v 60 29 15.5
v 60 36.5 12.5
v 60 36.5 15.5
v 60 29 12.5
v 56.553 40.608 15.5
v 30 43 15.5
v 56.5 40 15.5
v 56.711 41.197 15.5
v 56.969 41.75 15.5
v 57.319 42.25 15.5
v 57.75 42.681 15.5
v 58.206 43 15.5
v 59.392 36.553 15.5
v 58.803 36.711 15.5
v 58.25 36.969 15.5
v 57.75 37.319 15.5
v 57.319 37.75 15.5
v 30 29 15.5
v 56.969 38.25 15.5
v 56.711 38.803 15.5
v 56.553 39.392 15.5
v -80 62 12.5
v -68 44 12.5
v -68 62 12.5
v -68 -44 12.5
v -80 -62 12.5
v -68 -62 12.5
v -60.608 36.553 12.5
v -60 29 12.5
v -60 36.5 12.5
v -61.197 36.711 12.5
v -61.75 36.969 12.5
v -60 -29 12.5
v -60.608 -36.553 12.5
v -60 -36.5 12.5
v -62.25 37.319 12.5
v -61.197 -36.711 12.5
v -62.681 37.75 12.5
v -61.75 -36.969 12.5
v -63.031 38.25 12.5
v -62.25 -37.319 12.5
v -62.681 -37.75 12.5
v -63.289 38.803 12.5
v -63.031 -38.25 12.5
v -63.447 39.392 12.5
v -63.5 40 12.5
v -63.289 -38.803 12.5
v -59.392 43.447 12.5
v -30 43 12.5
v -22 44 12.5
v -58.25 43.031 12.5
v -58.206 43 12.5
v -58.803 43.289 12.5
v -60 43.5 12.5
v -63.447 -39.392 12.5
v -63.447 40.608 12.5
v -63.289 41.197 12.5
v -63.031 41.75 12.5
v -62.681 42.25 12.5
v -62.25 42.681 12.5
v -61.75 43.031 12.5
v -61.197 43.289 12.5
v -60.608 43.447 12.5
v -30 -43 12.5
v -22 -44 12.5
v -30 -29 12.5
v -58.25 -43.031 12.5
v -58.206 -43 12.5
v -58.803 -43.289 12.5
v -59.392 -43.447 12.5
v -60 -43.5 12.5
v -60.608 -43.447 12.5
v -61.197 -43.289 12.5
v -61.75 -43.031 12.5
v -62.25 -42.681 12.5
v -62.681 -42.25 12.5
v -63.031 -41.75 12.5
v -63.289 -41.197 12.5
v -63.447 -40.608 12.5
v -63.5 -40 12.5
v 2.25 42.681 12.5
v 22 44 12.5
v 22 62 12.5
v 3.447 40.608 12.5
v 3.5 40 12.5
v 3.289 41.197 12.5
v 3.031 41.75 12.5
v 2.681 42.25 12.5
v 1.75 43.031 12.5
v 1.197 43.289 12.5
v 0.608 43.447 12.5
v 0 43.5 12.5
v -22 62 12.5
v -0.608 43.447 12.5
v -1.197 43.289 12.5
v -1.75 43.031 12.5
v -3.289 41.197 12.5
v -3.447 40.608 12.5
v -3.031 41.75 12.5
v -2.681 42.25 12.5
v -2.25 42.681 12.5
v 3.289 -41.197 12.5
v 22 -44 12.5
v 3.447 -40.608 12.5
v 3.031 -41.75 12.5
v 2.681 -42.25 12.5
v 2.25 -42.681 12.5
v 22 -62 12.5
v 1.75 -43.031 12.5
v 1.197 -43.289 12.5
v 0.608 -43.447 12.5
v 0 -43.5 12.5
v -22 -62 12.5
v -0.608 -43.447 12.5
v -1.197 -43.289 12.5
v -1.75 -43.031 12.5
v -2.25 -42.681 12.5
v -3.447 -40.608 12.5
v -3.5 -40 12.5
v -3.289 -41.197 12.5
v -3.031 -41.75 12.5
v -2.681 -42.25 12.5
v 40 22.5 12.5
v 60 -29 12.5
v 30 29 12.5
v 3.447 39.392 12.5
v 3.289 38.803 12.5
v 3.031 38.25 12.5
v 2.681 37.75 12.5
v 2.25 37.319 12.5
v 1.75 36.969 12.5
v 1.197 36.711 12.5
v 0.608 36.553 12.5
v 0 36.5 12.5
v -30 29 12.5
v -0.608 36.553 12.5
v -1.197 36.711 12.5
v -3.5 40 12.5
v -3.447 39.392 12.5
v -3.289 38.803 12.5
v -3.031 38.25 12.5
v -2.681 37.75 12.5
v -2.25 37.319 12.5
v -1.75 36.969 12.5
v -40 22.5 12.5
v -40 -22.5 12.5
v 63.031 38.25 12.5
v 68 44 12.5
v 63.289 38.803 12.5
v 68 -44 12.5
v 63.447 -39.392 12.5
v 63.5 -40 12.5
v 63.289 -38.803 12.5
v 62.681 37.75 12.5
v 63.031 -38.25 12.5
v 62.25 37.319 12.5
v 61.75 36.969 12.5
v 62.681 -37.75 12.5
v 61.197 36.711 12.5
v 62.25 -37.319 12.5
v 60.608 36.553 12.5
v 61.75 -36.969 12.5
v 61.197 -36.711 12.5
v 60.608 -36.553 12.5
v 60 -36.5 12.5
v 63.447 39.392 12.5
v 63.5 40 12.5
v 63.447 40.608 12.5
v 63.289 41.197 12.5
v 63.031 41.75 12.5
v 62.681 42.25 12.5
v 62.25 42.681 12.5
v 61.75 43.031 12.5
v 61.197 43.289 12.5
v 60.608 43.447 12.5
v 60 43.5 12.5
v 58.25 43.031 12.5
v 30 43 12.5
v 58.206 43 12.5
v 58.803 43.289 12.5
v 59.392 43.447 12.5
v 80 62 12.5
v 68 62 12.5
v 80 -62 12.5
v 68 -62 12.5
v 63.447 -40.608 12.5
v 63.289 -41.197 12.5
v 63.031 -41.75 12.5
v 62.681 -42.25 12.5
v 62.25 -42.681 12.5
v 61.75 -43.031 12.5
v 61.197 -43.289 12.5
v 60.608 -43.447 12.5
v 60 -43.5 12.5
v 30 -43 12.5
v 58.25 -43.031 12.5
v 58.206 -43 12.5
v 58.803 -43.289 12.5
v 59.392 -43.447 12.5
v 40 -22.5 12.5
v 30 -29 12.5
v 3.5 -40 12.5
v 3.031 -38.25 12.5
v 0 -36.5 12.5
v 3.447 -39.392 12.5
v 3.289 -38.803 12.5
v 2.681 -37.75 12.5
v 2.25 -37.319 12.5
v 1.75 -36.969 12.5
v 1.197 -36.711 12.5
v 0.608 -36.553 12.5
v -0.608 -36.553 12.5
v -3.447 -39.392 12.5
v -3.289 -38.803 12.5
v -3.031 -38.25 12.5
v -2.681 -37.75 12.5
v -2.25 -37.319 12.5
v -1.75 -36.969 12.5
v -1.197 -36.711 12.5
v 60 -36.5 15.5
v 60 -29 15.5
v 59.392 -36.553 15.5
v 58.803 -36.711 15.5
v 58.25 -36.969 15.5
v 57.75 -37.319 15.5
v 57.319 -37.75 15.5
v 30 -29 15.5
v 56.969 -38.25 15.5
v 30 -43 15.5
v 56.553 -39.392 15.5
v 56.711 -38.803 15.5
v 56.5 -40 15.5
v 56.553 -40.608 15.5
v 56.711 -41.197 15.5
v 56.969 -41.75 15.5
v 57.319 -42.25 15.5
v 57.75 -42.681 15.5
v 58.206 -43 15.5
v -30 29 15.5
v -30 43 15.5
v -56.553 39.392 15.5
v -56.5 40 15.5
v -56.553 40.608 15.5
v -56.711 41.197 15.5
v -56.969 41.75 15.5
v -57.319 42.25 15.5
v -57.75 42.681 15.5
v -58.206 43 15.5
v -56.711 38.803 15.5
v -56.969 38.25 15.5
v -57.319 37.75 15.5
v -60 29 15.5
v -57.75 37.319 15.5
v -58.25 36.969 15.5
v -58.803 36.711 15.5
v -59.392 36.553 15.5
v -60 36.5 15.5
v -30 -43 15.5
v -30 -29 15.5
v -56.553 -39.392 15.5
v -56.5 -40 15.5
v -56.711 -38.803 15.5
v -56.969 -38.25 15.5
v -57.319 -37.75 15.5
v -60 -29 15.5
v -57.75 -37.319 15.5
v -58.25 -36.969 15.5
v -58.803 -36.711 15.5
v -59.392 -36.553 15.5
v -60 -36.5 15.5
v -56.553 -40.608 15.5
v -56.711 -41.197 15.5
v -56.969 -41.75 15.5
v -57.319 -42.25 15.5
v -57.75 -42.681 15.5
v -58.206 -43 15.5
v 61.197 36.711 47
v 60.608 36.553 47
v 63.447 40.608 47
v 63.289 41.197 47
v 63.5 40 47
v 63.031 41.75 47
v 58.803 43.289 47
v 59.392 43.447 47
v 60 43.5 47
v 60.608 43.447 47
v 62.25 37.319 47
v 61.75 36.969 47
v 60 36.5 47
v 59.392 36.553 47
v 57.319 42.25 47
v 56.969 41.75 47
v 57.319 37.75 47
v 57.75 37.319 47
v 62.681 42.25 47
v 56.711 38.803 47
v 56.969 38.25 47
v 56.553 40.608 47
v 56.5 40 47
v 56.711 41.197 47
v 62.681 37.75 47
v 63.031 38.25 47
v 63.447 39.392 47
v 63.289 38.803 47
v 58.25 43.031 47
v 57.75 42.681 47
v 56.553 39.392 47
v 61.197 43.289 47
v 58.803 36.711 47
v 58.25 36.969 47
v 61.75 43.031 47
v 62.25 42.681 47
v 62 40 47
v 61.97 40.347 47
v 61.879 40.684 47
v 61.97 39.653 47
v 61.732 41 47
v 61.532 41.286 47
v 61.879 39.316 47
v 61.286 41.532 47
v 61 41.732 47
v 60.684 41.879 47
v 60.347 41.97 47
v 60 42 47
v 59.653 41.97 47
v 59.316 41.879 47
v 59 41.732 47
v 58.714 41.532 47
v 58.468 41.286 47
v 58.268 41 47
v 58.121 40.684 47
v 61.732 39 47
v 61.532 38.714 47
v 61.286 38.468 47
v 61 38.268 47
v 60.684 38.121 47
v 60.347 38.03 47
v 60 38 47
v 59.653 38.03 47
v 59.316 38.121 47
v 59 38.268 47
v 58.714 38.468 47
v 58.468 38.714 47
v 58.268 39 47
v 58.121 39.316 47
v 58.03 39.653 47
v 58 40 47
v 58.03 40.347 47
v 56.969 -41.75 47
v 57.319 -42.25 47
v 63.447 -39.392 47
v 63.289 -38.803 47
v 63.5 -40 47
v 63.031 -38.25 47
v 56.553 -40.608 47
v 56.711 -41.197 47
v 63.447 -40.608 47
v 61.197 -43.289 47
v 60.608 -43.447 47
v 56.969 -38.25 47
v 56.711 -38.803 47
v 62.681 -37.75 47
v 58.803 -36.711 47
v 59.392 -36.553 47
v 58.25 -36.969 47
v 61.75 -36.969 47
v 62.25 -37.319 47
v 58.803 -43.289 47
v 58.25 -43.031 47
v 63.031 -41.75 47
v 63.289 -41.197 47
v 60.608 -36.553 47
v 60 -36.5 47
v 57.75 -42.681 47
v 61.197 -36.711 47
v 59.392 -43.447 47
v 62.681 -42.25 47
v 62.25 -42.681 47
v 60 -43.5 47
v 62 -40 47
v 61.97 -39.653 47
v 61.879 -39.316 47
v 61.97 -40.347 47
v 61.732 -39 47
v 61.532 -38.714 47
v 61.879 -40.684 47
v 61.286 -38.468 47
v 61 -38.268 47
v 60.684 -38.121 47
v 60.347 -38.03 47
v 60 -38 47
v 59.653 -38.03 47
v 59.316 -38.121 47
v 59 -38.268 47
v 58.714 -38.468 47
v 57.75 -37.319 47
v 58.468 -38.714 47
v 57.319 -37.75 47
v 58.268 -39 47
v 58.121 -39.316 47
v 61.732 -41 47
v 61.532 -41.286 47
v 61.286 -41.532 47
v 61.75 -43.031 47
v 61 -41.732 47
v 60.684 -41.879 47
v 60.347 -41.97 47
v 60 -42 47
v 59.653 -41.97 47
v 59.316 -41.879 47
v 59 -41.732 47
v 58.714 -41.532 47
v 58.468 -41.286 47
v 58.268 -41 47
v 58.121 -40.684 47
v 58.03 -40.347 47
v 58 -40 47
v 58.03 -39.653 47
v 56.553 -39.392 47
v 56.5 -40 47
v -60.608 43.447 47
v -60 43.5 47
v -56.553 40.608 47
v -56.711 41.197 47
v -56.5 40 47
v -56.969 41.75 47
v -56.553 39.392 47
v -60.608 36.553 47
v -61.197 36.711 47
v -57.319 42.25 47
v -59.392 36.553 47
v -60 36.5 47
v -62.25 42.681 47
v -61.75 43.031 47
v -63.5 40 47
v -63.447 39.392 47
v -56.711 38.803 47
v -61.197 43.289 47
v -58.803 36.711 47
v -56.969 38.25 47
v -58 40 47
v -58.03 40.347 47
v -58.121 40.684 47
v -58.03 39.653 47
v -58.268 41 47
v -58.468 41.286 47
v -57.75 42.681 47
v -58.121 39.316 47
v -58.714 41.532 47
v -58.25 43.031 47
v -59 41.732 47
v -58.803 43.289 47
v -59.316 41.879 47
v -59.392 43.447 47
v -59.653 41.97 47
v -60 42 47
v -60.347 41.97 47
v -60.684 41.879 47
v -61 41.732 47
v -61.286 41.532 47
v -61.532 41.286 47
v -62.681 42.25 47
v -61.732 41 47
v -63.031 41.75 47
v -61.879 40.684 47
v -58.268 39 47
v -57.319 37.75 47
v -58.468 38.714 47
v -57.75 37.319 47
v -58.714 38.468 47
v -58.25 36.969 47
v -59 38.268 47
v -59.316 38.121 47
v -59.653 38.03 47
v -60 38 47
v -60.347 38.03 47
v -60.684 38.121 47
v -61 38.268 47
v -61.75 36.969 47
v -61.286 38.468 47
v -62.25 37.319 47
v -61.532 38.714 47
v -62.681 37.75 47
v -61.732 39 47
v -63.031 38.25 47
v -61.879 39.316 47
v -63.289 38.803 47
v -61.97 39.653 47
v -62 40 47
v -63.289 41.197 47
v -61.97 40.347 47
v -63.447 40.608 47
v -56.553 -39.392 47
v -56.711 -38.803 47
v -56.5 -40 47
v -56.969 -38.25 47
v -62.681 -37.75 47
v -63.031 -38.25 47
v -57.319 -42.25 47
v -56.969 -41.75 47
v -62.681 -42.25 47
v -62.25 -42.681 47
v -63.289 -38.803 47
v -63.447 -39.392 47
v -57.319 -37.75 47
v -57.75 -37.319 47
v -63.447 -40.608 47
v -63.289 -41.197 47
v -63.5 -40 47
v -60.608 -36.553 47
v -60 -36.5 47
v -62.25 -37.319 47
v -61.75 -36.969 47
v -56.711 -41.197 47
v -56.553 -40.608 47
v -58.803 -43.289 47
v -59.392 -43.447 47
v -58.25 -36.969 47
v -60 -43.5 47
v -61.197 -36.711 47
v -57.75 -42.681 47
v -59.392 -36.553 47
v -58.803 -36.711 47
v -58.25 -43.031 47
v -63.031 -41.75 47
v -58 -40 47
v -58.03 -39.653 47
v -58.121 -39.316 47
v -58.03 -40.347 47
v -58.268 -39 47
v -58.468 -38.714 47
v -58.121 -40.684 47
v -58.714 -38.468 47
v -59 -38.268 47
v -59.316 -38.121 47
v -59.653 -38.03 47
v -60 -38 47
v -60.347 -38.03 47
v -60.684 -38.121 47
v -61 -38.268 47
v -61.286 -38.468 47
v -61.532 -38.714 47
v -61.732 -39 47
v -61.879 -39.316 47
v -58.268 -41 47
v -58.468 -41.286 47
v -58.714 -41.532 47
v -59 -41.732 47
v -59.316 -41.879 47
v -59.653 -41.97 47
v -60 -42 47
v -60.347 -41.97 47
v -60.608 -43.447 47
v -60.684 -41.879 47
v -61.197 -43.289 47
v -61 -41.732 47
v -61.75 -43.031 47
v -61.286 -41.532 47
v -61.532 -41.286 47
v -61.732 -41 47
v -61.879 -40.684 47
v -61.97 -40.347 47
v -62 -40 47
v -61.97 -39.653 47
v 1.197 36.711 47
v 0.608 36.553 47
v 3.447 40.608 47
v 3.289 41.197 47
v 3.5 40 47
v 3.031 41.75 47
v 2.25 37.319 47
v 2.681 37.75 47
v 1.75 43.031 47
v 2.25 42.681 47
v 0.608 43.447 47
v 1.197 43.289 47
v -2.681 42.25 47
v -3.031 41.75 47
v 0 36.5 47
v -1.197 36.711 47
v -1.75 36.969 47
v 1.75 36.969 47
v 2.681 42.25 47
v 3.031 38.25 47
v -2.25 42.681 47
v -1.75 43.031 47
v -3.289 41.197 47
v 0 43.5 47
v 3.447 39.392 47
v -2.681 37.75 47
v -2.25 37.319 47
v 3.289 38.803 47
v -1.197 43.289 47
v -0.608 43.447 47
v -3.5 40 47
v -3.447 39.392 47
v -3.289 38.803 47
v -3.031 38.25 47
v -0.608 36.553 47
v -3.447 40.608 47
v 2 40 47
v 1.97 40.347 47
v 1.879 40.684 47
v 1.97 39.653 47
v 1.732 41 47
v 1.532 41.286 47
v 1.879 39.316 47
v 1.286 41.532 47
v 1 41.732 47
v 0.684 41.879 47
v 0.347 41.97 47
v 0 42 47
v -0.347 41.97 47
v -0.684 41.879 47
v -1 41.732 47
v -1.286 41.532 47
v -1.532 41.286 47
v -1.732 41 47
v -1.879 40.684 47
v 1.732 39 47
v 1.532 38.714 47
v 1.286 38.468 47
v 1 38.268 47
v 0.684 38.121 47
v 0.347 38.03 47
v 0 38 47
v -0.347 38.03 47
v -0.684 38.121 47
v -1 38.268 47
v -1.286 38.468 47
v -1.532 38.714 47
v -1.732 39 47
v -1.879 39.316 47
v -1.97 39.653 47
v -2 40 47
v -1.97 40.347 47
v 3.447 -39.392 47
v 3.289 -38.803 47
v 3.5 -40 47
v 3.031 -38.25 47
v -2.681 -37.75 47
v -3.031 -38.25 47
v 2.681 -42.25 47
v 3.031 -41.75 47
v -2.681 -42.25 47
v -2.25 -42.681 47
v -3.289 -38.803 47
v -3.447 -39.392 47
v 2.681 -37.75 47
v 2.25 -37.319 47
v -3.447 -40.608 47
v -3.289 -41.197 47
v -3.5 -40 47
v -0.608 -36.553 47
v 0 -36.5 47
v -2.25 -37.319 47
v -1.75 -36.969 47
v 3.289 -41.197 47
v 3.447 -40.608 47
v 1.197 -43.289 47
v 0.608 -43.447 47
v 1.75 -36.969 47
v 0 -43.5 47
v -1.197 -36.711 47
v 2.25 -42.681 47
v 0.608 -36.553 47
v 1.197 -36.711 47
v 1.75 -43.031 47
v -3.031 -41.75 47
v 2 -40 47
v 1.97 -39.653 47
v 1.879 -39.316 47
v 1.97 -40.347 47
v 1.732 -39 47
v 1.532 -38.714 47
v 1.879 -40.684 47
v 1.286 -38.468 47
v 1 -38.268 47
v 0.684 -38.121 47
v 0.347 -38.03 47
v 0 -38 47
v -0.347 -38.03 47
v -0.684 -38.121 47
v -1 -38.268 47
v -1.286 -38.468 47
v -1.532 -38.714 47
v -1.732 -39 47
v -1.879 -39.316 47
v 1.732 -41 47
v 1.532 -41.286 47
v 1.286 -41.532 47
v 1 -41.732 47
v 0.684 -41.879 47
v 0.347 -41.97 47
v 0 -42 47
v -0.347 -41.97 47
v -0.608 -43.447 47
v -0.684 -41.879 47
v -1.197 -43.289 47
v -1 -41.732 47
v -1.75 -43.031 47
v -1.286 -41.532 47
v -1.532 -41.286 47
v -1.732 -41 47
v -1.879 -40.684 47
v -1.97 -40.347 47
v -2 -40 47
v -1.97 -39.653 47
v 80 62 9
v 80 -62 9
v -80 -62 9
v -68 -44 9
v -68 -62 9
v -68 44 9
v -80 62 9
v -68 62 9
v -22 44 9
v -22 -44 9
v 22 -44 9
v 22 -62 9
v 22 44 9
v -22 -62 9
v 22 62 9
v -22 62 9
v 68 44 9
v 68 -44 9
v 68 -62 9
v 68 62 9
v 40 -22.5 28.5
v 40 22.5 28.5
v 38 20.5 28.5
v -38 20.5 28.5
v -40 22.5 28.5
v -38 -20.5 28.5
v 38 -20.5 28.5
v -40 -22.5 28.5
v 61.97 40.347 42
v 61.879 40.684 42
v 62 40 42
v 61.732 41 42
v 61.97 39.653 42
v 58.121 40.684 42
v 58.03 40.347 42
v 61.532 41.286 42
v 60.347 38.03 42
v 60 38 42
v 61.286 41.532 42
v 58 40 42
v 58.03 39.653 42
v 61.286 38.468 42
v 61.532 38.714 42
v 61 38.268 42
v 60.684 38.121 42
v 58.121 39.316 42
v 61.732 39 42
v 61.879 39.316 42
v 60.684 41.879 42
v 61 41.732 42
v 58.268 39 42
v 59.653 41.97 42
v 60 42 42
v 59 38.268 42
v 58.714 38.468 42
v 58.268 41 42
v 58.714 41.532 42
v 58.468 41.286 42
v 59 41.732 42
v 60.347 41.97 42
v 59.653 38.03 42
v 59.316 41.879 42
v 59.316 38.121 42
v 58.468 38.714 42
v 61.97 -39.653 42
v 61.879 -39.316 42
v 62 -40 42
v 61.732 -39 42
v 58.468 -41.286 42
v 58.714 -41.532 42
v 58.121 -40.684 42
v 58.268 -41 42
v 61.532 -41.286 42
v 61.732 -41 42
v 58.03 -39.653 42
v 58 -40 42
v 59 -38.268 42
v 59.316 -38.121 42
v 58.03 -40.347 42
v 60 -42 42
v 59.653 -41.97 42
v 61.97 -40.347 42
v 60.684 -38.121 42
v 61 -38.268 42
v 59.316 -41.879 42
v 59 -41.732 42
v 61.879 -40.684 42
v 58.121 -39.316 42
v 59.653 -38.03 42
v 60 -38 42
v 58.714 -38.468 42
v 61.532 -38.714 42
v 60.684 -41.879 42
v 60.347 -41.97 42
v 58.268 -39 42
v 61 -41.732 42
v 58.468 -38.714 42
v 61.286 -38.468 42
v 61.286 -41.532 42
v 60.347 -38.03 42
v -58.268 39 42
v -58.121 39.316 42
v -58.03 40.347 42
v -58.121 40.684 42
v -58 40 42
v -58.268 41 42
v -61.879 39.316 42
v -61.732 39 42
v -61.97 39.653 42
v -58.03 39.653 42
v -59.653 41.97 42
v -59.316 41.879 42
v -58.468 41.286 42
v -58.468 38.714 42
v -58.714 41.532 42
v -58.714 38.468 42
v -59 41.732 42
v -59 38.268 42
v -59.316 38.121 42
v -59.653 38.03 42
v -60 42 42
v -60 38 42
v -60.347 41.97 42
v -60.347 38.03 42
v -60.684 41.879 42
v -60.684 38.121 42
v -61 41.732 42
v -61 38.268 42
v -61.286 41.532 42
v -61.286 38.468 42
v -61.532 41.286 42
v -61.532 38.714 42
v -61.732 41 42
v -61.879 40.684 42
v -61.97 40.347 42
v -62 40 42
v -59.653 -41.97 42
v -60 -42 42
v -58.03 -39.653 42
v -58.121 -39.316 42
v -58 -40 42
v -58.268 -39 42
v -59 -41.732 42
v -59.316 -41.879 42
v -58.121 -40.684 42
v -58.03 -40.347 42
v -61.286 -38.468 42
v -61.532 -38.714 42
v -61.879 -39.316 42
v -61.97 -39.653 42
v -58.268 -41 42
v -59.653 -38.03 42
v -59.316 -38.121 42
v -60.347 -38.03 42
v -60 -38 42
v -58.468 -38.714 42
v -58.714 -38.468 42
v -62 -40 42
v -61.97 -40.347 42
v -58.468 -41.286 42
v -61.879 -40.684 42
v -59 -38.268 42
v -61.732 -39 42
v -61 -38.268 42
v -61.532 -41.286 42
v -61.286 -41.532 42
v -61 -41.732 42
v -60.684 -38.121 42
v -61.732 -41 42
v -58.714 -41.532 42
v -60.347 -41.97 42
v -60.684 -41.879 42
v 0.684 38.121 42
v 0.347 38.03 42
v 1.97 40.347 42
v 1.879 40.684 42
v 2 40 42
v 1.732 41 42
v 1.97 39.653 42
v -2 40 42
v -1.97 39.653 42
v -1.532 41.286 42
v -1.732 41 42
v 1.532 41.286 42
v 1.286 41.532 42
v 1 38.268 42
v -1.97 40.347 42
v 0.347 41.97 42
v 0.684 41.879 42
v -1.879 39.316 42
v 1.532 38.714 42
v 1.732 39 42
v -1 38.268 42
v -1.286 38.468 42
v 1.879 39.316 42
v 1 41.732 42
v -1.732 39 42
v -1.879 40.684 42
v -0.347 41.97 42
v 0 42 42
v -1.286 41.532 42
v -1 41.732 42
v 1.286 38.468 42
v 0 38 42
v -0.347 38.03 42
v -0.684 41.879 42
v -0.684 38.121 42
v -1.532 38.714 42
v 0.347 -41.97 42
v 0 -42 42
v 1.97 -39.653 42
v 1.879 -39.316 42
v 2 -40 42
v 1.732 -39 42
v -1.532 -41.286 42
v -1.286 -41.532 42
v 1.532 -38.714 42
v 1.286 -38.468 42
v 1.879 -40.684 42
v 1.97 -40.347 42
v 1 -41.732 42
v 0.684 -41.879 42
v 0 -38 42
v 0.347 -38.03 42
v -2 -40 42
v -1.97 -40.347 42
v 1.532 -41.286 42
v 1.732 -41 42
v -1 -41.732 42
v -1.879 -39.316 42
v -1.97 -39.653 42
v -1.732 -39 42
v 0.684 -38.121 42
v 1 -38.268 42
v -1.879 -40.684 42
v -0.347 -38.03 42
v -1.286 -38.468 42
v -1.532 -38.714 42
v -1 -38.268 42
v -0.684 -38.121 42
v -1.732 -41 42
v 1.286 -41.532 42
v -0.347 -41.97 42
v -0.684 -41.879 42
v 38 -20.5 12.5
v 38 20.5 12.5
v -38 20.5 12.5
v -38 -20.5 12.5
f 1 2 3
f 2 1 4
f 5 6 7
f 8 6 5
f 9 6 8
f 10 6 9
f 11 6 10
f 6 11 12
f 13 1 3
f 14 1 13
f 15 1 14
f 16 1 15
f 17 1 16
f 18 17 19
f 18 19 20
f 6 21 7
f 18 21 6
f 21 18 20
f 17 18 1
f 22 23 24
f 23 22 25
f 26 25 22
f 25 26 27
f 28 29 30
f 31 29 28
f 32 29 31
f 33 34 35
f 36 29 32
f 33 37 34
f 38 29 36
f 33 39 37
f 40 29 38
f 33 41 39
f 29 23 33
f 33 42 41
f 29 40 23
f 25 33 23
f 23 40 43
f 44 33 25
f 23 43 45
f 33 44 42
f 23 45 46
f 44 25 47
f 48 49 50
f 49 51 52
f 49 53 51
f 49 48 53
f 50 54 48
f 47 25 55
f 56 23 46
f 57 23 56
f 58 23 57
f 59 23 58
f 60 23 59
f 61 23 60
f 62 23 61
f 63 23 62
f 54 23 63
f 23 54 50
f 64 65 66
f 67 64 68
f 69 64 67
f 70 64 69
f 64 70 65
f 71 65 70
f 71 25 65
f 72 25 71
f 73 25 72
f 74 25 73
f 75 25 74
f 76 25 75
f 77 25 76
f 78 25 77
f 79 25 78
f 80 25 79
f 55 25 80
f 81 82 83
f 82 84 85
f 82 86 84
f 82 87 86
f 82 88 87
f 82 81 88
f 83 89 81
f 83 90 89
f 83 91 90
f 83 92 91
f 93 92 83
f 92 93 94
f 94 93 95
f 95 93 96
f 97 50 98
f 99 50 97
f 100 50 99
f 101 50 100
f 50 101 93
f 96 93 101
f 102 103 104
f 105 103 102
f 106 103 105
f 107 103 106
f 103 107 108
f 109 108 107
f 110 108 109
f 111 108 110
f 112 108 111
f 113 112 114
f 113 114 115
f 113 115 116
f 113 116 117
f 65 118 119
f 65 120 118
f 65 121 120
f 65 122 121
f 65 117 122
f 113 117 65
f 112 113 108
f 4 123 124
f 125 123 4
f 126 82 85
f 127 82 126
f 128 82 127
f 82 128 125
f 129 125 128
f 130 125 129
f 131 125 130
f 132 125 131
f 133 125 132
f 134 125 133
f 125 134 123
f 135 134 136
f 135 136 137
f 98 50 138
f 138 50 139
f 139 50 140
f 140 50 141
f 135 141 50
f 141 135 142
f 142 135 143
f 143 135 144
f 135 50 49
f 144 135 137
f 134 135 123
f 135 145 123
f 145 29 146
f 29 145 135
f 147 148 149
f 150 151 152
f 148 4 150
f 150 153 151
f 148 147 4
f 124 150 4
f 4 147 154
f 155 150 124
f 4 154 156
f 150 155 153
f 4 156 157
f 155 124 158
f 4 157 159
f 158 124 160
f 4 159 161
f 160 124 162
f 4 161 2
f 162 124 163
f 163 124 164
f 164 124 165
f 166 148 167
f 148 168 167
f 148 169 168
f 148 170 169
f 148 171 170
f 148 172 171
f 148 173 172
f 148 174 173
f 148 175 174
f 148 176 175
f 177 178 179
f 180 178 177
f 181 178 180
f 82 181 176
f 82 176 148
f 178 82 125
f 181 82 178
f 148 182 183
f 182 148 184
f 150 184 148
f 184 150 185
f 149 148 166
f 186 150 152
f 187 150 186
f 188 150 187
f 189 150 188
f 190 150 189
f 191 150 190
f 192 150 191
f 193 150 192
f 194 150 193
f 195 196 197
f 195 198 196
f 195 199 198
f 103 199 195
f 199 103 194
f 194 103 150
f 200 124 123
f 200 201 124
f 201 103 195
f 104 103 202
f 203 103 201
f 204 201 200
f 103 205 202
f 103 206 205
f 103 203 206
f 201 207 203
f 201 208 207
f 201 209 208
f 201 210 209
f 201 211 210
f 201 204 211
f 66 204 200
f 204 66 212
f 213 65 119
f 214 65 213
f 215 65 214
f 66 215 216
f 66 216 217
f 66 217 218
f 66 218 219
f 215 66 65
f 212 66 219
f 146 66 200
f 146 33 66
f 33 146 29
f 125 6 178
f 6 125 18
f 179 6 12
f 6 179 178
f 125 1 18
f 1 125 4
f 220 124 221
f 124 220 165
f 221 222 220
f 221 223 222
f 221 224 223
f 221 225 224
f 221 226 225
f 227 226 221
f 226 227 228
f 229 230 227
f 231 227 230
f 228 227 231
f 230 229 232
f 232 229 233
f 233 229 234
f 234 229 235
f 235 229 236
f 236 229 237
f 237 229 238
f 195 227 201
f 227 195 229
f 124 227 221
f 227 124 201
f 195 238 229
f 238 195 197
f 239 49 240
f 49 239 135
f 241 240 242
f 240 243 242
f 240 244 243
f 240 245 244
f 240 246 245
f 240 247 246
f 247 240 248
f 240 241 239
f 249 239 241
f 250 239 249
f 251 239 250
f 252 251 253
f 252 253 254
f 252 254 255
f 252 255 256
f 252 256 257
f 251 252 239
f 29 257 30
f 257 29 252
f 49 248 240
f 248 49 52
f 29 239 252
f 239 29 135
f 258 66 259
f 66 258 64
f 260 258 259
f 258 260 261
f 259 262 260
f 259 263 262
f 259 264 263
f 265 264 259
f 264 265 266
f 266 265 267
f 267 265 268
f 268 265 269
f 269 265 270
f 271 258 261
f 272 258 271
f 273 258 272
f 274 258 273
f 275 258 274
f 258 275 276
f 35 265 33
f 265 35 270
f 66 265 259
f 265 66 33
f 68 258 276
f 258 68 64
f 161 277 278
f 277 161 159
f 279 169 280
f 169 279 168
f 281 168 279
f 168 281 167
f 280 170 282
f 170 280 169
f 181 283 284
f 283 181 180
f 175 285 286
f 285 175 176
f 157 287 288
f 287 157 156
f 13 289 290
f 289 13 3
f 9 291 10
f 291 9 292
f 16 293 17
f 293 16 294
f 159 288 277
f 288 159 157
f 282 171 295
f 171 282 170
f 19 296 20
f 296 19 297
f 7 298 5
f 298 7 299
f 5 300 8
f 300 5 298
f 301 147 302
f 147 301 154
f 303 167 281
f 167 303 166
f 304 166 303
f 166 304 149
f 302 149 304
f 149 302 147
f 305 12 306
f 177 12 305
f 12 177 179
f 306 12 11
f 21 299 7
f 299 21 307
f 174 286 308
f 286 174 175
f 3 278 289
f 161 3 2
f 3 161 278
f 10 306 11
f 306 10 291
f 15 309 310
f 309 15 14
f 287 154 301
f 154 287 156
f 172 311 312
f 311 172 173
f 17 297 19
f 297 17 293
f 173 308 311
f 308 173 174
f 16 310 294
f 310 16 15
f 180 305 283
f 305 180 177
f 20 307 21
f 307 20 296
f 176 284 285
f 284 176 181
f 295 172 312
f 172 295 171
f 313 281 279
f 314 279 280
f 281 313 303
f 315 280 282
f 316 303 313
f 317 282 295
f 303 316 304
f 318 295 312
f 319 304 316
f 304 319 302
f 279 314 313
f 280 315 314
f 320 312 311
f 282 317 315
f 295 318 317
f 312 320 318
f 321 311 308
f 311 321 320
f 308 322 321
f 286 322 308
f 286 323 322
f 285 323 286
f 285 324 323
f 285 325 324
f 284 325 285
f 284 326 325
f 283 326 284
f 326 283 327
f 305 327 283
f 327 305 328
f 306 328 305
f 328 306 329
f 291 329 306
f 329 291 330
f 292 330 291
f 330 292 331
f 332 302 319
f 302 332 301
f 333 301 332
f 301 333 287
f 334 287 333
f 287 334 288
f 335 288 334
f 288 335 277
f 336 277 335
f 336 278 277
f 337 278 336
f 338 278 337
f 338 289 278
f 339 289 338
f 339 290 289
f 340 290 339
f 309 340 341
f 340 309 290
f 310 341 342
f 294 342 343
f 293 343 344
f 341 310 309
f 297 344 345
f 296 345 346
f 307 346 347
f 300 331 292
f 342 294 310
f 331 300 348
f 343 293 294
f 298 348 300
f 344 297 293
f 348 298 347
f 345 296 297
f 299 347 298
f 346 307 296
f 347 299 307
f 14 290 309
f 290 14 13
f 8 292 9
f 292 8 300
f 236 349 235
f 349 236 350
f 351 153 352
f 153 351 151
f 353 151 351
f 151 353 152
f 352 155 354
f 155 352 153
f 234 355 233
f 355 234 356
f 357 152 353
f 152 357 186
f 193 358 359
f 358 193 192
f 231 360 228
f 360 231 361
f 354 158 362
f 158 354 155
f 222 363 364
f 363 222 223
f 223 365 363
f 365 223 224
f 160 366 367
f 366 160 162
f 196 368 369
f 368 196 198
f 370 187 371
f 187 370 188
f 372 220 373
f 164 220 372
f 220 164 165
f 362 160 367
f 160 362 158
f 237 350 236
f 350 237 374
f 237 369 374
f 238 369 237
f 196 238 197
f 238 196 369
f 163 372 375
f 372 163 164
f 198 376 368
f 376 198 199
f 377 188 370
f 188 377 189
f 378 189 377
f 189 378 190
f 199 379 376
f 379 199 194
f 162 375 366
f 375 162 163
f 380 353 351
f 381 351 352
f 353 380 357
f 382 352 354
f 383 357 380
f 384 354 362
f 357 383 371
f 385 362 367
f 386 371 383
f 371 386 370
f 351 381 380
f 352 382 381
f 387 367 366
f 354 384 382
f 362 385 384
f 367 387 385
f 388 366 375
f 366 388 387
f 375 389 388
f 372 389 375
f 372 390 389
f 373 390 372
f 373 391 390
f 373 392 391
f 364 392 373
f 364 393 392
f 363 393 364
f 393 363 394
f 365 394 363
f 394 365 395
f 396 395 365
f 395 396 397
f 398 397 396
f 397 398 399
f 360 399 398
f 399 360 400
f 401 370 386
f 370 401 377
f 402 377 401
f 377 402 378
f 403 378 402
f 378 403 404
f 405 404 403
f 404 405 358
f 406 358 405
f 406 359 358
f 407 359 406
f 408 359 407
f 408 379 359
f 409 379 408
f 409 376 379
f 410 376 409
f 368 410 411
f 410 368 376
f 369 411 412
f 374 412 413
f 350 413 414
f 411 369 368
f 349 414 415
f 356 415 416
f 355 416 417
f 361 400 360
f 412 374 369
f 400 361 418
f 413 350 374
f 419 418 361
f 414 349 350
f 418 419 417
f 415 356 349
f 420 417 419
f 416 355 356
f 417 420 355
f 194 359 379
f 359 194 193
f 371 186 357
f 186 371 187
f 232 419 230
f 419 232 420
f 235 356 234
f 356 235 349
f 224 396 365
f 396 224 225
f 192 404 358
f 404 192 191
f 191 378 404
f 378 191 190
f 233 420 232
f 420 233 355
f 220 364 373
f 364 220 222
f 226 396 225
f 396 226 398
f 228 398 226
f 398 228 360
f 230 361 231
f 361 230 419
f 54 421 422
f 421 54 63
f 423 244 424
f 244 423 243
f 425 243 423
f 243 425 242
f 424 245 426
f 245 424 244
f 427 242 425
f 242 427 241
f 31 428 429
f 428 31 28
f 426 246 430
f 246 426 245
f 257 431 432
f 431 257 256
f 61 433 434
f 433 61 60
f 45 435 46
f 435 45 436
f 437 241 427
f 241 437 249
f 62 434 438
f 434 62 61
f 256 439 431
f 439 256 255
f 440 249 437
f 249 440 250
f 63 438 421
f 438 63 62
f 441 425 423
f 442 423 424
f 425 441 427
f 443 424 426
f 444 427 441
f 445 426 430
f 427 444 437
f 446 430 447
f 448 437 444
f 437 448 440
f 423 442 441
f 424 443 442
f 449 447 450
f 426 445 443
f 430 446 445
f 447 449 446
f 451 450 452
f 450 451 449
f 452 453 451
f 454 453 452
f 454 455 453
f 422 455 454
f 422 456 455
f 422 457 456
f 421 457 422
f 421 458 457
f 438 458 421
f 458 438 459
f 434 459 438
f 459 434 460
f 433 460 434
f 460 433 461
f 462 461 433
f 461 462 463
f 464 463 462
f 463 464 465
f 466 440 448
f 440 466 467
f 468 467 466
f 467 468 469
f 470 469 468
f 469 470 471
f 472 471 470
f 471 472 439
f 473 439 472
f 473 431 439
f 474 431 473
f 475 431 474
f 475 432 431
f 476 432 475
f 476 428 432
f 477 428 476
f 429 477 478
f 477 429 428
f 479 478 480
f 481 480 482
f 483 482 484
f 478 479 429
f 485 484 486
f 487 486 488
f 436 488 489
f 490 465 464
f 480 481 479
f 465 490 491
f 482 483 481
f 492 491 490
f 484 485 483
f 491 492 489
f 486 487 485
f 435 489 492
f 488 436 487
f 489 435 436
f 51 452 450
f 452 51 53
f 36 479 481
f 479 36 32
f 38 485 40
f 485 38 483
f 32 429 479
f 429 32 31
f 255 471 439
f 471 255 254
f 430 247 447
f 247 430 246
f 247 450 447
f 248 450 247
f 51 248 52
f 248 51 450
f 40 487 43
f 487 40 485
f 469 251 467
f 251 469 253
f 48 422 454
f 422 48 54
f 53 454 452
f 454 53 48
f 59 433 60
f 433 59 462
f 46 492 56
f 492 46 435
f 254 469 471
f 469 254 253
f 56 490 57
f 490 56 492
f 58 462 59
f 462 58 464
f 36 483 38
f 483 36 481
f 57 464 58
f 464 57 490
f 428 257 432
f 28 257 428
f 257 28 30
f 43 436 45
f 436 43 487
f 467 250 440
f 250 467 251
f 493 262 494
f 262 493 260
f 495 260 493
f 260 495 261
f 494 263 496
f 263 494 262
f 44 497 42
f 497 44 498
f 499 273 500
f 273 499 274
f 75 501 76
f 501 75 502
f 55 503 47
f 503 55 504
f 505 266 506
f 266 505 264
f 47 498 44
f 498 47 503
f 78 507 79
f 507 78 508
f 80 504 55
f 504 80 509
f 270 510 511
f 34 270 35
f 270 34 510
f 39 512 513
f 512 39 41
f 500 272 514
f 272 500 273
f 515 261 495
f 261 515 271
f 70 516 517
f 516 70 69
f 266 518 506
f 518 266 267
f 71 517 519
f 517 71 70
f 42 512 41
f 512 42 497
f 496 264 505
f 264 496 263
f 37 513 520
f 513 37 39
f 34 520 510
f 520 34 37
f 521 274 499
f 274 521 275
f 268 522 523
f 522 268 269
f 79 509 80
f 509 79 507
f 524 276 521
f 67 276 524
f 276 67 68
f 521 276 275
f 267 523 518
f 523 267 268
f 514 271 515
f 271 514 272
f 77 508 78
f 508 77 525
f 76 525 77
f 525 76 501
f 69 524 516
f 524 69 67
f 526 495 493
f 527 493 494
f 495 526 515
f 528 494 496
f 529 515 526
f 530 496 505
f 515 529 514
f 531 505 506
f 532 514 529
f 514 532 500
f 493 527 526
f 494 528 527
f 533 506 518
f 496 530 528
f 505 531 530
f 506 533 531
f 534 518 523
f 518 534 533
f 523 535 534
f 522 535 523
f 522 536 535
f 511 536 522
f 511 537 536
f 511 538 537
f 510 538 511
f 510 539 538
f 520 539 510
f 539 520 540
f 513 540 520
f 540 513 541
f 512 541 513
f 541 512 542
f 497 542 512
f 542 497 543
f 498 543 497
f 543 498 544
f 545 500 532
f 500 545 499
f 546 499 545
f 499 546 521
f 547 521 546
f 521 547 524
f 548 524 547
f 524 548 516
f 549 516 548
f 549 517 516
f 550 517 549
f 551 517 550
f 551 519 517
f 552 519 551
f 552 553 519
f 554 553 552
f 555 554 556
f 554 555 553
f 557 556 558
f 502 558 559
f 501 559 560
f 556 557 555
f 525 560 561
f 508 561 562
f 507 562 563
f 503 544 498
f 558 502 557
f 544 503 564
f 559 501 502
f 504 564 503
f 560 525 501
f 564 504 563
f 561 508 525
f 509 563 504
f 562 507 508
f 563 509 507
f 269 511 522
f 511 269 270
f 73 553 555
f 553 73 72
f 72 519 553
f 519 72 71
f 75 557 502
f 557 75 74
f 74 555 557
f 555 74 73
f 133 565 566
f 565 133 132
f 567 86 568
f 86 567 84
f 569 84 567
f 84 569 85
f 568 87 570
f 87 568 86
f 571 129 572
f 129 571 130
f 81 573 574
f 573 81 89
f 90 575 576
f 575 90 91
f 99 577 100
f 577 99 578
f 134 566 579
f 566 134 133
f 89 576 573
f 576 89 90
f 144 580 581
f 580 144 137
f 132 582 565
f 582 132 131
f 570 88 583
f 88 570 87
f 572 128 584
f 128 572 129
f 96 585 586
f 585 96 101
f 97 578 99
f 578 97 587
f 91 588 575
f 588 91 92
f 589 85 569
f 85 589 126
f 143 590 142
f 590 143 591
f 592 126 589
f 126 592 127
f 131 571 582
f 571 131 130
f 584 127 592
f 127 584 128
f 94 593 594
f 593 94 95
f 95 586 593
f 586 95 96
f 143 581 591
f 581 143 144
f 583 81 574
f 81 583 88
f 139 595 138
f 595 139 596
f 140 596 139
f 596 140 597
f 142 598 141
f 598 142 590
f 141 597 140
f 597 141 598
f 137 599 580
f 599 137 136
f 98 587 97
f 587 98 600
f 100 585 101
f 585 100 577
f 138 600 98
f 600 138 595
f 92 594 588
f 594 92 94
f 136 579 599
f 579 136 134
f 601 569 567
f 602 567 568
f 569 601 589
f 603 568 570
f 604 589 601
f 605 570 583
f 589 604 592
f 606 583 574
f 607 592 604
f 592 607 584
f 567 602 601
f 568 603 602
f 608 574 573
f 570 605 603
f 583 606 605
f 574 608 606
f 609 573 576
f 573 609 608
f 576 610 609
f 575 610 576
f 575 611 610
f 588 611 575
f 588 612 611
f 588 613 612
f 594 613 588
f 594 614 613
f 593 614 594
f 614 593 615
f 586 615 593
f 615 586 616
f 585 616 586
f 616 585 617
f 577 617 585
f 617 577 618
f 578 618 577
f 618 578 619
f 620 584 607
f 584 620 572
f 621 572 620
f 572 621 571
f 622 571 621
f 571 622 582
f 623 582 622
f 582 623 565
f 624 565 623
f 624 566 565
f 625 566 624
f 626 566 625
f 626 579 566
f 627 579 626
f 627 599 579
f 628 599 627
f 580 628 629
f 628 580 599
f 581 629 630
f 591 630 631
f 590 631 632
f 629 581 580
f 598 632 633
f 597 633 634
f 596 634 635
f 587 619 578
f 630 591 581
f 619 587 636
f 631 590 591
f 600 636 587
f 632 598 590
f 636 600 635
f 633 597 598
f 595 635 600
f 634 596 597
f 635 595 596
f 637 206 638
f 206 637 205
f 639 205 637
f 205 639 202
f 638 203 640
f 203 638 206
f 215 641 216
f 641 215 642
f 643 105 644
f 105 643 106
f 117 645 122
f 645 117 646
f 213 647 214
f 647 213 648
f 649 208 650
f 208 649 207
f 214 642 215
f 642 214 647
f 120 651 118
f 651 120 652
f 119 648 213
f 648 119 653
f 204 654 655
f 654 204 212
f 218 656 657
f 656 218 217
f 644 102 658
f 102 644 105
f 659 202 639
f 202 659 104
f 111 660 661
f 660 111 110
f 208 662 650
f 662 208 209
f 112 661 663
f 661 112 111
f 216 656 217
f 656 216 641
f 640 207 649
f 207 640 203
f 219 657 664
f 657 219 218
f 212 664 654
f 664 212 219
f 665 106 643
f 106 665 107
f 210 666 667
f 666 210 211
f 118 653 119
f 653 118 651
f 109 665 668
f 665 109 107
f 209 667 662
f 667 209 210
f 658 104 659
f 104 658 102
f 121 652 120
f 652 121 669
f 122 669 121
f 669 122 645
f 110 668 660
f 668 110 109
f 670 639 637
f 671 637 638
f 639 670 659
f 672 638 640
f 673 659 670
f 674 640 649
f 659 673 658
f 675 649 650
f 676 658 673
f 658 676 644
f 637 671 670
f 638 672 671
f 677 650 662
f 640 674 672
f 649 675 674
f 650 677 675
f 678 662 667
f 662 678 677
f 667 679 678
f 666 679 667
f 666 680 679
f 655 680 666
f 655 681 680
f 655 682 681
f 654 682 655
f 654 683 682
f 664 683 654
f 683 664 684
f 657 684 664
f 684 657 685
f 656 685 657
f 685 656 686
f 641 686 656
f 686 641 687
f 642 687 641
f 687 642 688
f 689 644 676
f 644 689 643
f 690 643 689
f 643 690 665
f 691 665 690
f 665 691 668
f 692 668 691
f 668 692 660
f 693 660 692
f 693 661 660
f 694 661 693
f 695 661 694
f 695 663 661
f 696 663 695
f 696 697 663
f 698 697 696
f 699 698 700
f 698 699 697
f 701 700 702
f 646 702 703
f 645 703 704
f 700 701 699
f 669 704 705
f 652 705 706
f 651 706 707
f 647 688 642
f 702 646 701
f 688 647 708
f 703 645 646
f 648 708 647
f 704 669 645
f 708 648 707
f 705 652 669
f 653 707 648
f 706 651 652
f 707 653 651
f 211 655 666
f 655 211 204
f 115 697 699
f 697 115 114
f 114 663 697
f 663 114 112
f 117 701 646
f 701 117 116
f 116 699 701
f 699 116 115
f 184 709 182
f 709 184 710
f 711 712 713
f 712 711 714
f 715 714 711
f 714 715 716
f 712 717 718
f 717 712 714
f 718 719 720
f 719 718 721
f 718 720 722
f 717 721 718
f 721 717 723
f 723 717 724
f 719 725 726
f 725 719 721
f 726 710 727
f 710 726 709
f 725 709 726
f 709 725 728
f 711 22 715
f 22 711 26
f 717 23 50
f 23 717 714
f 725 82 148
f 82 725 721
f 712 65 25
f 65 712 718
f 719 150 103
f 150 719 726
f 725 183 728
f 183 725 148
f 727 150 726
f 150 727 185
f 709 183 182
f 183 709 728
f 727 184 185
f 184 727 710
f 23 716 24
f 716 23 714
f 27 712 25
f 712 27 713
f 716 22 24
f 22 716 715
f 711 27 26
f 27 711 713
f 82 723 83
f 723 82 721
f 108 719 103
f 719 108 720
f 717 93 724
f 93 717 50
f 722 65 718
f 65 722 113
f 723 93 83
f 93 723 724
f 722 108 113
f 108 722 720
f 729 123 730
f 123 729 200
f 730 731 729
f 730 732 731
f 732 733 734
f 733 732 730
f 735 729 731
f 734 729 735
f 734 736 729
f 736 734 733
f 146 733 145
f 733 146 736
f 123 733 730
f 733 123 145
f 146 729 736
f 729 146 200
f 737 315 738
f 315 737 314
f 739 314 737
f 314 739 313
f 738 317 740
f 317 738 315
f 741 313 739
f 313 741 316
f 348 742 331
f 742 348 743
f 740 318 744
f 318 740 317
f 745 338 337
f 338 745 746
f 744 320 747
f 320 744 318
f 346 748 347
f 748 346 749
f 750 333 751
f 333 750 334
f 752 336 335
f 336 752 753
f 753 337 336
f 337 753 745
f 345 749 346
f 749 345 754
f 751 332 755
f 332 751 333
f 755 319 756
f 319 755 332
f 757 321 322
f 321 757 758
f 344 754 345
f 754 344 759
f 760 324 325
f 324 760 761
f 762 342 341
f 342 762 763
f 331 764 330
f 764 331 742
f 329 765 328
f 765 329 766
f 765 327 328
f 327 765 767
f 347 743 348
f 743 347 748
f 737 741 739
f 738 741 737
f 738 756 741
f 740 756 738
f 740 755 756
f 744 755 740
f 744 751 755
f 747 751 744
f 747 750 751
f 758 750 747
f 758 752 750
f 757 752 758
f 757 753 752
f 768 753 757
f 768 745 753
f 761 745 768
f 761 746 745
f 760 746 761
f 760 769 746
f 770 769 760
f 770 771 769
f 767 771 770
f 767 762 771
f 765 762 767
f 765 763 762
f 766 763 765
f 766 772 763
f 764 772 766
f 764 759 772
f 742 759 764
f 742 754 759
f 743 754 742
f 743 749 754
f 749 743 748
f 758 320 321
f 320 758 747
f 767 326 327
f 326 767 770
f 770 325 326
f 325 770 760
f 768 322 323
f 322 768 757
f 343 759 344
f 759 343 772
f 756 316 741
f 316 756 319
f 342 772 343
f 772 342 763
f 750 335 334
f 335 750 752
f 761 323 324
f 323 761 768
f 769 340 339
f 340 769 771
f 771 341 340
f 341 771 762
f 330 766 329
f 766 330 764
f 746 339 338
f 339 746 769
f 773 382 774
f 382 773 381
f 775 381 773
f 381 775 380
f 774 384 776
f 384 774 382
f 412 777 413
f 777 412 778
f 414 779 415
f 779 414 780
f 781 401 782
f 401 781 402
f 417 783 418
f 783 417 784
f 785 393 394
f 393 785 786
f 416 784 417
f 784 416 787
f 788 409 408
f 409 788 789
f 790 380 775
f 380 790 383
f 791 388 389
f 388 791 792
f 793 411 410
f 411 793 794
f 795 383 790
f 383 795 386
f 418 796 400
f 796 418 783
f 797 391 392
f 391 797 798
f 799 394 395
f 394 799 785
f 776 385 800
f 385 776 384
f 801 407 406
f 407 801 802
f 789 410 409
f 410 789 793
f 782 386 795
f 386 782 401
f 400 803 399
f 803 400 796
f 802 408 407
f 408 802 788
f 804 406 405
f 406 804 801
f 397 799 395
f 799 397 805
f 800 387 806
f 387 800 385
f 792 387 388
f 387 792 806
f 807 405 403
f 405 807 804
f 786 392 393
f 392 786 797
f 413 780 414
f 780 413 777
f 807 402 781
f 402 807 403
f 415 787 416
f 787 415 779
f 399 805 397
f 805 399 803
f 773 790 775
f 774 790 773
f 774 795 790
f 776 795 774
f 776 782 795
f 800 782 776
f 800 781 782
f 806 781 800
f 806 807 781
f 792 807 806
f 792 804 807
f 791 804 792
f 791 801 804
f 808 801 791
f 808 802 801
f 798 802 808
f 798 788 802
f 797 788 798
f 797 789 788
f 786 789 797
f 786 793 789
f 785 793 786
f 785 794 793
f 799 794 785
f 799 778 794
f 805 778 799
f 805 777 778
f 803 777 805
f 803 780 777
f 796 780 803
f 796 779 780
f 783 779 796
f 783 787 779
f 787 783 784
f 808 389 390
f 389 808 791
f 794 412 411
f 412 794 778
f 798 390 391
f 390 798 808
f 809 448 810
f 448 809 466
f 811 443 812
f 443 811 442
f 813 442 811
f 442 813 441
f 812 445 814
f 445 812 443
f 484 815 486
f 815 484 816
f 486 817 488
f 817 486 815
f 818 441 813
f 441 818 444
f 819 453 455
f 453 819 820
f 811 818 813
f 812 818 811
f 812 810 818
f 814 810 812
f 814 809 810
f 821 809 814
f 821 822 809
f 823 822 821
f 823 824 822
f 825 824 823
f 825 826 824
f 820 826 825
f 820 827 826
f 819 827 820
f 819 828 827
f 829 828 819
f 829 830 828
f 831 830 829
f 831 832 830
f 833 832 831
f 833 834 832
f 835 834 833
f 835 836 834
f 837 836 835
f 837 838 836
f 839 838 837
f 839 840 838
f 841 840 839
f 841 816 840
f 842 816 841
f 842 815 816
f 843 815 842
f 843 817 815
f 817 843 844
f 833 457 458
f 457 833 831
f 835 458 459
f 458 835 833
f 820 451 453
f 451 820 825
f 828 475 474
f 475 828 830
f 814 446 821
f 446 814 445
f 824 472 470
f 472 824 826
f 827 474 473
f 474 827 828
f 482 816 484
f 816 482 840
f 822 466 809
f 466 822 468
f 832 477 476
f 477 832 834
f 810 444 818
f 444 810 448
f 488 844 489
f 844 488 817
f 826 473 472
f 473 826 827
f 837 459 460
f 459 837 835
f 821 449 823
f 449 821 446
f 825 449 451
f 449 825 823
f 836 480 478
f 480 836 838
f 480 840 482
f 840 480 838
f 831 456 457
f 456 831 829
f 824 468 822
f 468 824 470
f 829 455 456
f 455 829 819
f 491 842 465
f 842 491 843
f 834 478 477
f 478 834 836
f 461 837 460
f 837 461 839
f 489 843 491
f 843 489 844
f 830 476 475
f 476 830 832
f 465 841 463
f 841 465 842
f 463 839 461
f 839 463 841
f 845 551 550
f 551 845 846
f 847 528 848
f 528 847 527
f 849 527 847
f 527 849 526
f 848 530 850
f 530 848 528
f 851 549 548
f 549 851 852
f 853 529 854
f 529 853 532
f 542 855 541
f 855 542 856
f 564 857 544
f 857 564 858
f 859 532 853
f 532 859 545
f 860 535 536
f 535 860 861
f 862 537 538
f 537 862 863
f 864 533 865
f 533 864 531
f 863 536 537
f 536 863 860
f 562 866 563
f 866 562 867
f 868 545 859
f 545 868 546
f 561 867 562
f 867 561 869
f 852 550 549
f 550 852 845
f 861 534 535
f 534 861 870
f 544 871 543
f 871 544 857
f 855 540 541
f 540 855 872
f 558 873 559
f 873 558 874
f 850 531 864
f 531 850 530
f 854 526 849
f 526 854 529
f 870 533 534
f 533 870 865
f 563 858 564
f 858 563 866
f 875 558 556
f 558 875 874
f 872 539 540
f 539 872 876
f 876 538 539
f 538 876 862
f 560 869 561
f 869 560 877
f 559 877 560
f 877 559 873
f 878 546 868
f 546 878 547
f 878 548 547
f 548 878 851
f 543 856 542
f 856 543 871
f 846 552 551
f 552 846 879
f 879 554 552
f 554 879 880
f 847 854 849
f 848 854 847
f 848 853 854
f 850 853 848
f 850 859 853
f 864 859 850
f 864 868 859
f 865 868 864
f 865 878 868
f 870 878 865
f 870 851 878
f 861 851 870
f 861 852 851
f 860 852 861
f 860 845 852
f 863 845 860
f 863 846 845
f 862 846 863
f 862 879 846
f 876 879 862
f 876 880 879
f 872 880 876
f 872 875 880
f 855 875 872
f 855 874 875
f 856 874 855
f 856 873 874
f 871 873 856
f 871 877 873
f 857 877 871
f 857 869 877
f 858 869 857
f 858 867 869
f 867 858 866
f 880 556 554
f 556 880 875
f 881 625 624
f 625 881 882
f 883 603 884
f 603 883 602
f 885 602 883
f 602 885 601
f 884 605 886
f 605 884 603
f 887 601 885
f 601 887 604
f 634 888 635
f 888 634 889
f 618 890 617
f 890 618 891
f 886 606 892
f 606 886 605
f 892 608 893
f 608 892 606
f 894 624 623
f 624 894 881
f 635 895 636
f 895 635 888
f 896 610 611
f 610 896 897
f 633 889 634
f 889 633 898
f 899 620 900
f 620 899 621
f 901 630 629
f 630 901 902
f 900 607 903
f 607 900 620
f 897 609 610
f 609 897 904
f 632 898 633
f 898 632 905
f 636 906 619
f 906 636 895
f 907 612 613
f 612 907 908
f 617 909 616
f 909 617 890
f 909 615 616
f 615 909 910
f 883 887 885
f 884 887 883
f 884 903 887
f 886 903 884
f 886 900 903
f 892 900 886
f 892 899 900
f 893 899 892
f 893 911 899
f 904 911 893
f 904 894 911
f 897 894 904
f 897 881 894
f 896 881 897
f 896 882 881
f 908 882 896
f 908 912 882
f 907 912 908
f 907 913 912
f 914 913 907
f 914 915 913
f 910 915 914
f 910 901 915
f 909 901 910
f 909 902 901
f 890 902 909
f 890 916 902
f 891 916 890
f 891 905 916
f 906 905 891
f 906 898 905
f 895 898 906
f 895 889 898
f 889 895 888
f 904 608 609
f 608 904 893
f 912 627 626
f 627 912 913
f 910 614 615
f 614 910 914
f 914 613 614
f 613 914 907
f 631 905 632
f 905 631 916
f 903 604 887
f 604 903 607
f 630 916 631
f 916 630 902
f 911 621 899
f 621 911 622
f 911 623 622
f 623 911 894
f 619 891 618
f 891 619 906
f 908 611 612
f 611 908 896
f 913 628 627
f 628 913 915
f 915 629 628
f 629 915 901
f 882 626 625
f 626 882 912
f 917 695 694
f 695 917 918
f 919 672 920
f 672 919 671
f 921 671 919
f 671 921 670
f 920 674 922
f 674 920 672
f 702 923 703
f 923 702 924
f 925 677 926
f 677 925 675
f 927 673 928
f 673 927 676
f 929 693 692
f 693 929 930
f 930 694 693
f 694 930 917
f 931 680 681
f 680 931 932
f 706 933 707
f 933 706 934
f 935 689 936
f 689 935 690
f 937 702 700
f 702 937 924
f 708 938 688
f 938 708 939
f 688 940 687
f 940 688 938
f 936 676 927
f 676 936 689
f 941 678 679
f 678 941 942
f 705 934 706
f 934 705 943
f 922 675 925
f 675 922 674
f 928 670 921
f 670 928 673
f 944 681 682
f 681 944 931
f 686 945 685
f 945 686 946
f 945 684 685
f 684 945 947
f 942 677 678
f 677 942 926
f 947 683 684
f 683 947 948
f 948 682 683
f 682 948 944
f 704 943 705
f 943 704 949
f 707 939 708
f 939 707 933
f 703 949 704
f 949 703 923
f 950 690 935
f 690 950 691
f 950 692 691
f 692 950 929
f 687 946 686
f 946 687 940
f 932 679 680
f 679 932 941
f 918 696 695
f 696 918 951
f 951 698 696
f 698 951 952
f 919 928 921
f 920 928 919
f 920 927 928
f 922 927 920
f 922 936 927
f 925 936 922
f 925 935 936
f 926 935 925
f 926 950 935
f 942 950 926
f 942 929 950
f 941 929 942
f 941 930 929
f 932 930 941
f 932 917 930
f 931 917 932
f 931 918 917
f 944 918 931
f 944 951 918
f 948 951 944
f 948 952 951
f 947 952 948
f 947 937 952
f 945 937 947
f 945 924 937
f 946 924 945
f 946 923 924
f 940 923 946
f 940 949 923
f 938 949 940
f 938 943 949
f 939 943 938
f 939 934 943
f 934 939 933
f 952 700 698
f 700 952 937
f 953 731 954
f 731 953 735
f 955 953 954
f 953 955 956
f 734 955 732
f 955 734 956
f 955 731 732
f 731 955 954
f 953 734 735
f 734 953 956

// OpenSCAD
// file: cyber_parameters.scad
// ============================================================================
// cute-esp32-lego-car / cad / cyber-print / cyber_parameters.scad
// 拓竹 A1 3D打印机赛博黑透战术探索版参数化核心尺寸库 (单位: mm)
// ============================================================================

$fn = 36;

// 1. 机电驱动与车轮参数 (基于订单 Row 18/23/38 实物核算)
wheel_diameter       = 34.0;  // ZJ327 橡胶轮外径 34.0mm
wheel_tire_width     = 7.0;   // 胎面宽 7.0mm
wheel_hub_width      = 9.5;   // 轮毂总厚 9.5mm (含内侧码盘凸台)
wheel_axle_dia       = 3.0;   // 3mm D型轴
wheel_axle_z         = 17.0;  // 轮轴中心距地高 17.0mm (= 34/2 完美同心)
ground_clearance     = 9.0;   // 底盘最低离地间隙 9.0mm

// 1812-N20 蜗轮蜗杆减速电机 (6V 190RPM 速比42 纵向安装)
n20_gearbox_l        = 18.0;  // 1812 蜗轮箱长
n20_motor_l          = 15.0;  // 电机筒长
n20_total_l          = 33.0;  // 电机总长
n20_width            = 12.0;  // 机身宽
n20_height           = 10.0;  // 机身高
n20_shaft_offset_x   = 6.0;   // 轴距齿轮箱前缘距离

// 2. 关键几何布局 (针对蜗轮自锁差速转向优化)
wheelbase            = 90.0;  // 前后轴距 90.0mm (前轴 +45mm, 后轴 -45mm)
track_width          = 107.5; // 左右轮胎中心距 107.5mm
ratio_wb_tw          = wheelbase / track_width; // 0.837 差速转向黄金比

// 3. 2S 18650 电池仓与电子托盘
bat_bay_l            = 76.0;  // 电池仓净内长
bat_bay_w            = 41.0;  // 电池仓净内宽
bat_bay_h            = 16.0;  // 电池仓槽深

// 4. 电子板安装孔距
esp32_hole_x         = 60.0;  // 38Pin 扩展板长向孔距
esp32_hole_y         = 47.0;  // 38Pin 扩展板宽向孔距
l298n_hole_pitch     = 37.0;  // L298N 驱动板 37x37mm 标准孔距
lm2596_hole_dist     = 31.0;  // LM2596S 对角孔距

// 5. 3D 打印配合与公差设计 (拓竹 A1 级精度)
m3_heatset_hole_dia  = 4.0;   // M3 热熔铜螺母预留底孔 Ø4.0mm
m3_pass_hole_dia     = 3.4;   // M3 穿钉过孔 Ø3.4mm
magnet_dia           = 4.2;   // Ø4x2mm 磁铁嵌入槽孔径
magnet_depth         = 2.2;   // 磁铁沉槽深度
min_wall_thickness   = 2.0;   // 结构外壁最小厚度
chamfer_angle        = 45.0;  // 45° 无支撑自支撑斜角
// main file
// ============================================================================
// Part 1: 一体化动力底盘 (Lower Power & Drive Chassis)
// ============================================================================
include <cyber_parameters.scad>

module lower_power_chassis() {
    difference() {
        union() {
            // 主底盘大底 (160 x 124 x 3.5 mm)
            translate([-80, -44, ground_clearance])
                cube([160, 88, 3.5]);
            // 前后翼子板与保险杠斜坡
            translate([68, -62, ground_clearance]) cube([12, 124, 3.5]);
            translate([-80, -62, ground_clearance]) cube([12, 124, 3.5]);
            translate([-22, -62, ground_clearance]) cube([44, 124, 3.5]);

            // 4x 1812-N20 电机一体化沉托与固定座
            for (mx = [45, -45], my = [36, -36]) {
                translate([mx - 15, my - 7, ground_clearance + 3.5])
                    cube([30, 14, 3.0]);
            }

            // 中置 2S 18650 电池内嵌仓外壁
            translate([-bat_bay_l/2 - 2, -bat_bay_w/2 - 2, ground_clearance + 3.5])
                cube([bat_bay_l + 4, bat_bay_w + 4, bat_bay_h]);

            // 6 根 M3 中层托盘承重立柱 (高 34.5mm)
            for (px = [60, -60, 0], py = [40, -40]) {
                translate([px, py, ground_clearance + 3.5])
                    cylinder(d = 7.0, h = 34.5);
            }
        }

        // 减去: 电池内腔
        translate([-bat_bay_l/2, -bat_bay_w/2, ground_clearance + 3.5])
            cube([bat_bay_l, bat_bay_w, bat_bay_h + 1]);

        // 减去: 6 根立柱顶端 M3 热熔铜螺母沉孔
        for (px = [60, -60, 0], py = [40, -40]) {
            translate([px, py, ground_clearance + 38.0 - 5.0])
                cylinder(d = m3_heatset_hole_dia, h = 6.0);
        }
    }
}

lower_power_chassis();
